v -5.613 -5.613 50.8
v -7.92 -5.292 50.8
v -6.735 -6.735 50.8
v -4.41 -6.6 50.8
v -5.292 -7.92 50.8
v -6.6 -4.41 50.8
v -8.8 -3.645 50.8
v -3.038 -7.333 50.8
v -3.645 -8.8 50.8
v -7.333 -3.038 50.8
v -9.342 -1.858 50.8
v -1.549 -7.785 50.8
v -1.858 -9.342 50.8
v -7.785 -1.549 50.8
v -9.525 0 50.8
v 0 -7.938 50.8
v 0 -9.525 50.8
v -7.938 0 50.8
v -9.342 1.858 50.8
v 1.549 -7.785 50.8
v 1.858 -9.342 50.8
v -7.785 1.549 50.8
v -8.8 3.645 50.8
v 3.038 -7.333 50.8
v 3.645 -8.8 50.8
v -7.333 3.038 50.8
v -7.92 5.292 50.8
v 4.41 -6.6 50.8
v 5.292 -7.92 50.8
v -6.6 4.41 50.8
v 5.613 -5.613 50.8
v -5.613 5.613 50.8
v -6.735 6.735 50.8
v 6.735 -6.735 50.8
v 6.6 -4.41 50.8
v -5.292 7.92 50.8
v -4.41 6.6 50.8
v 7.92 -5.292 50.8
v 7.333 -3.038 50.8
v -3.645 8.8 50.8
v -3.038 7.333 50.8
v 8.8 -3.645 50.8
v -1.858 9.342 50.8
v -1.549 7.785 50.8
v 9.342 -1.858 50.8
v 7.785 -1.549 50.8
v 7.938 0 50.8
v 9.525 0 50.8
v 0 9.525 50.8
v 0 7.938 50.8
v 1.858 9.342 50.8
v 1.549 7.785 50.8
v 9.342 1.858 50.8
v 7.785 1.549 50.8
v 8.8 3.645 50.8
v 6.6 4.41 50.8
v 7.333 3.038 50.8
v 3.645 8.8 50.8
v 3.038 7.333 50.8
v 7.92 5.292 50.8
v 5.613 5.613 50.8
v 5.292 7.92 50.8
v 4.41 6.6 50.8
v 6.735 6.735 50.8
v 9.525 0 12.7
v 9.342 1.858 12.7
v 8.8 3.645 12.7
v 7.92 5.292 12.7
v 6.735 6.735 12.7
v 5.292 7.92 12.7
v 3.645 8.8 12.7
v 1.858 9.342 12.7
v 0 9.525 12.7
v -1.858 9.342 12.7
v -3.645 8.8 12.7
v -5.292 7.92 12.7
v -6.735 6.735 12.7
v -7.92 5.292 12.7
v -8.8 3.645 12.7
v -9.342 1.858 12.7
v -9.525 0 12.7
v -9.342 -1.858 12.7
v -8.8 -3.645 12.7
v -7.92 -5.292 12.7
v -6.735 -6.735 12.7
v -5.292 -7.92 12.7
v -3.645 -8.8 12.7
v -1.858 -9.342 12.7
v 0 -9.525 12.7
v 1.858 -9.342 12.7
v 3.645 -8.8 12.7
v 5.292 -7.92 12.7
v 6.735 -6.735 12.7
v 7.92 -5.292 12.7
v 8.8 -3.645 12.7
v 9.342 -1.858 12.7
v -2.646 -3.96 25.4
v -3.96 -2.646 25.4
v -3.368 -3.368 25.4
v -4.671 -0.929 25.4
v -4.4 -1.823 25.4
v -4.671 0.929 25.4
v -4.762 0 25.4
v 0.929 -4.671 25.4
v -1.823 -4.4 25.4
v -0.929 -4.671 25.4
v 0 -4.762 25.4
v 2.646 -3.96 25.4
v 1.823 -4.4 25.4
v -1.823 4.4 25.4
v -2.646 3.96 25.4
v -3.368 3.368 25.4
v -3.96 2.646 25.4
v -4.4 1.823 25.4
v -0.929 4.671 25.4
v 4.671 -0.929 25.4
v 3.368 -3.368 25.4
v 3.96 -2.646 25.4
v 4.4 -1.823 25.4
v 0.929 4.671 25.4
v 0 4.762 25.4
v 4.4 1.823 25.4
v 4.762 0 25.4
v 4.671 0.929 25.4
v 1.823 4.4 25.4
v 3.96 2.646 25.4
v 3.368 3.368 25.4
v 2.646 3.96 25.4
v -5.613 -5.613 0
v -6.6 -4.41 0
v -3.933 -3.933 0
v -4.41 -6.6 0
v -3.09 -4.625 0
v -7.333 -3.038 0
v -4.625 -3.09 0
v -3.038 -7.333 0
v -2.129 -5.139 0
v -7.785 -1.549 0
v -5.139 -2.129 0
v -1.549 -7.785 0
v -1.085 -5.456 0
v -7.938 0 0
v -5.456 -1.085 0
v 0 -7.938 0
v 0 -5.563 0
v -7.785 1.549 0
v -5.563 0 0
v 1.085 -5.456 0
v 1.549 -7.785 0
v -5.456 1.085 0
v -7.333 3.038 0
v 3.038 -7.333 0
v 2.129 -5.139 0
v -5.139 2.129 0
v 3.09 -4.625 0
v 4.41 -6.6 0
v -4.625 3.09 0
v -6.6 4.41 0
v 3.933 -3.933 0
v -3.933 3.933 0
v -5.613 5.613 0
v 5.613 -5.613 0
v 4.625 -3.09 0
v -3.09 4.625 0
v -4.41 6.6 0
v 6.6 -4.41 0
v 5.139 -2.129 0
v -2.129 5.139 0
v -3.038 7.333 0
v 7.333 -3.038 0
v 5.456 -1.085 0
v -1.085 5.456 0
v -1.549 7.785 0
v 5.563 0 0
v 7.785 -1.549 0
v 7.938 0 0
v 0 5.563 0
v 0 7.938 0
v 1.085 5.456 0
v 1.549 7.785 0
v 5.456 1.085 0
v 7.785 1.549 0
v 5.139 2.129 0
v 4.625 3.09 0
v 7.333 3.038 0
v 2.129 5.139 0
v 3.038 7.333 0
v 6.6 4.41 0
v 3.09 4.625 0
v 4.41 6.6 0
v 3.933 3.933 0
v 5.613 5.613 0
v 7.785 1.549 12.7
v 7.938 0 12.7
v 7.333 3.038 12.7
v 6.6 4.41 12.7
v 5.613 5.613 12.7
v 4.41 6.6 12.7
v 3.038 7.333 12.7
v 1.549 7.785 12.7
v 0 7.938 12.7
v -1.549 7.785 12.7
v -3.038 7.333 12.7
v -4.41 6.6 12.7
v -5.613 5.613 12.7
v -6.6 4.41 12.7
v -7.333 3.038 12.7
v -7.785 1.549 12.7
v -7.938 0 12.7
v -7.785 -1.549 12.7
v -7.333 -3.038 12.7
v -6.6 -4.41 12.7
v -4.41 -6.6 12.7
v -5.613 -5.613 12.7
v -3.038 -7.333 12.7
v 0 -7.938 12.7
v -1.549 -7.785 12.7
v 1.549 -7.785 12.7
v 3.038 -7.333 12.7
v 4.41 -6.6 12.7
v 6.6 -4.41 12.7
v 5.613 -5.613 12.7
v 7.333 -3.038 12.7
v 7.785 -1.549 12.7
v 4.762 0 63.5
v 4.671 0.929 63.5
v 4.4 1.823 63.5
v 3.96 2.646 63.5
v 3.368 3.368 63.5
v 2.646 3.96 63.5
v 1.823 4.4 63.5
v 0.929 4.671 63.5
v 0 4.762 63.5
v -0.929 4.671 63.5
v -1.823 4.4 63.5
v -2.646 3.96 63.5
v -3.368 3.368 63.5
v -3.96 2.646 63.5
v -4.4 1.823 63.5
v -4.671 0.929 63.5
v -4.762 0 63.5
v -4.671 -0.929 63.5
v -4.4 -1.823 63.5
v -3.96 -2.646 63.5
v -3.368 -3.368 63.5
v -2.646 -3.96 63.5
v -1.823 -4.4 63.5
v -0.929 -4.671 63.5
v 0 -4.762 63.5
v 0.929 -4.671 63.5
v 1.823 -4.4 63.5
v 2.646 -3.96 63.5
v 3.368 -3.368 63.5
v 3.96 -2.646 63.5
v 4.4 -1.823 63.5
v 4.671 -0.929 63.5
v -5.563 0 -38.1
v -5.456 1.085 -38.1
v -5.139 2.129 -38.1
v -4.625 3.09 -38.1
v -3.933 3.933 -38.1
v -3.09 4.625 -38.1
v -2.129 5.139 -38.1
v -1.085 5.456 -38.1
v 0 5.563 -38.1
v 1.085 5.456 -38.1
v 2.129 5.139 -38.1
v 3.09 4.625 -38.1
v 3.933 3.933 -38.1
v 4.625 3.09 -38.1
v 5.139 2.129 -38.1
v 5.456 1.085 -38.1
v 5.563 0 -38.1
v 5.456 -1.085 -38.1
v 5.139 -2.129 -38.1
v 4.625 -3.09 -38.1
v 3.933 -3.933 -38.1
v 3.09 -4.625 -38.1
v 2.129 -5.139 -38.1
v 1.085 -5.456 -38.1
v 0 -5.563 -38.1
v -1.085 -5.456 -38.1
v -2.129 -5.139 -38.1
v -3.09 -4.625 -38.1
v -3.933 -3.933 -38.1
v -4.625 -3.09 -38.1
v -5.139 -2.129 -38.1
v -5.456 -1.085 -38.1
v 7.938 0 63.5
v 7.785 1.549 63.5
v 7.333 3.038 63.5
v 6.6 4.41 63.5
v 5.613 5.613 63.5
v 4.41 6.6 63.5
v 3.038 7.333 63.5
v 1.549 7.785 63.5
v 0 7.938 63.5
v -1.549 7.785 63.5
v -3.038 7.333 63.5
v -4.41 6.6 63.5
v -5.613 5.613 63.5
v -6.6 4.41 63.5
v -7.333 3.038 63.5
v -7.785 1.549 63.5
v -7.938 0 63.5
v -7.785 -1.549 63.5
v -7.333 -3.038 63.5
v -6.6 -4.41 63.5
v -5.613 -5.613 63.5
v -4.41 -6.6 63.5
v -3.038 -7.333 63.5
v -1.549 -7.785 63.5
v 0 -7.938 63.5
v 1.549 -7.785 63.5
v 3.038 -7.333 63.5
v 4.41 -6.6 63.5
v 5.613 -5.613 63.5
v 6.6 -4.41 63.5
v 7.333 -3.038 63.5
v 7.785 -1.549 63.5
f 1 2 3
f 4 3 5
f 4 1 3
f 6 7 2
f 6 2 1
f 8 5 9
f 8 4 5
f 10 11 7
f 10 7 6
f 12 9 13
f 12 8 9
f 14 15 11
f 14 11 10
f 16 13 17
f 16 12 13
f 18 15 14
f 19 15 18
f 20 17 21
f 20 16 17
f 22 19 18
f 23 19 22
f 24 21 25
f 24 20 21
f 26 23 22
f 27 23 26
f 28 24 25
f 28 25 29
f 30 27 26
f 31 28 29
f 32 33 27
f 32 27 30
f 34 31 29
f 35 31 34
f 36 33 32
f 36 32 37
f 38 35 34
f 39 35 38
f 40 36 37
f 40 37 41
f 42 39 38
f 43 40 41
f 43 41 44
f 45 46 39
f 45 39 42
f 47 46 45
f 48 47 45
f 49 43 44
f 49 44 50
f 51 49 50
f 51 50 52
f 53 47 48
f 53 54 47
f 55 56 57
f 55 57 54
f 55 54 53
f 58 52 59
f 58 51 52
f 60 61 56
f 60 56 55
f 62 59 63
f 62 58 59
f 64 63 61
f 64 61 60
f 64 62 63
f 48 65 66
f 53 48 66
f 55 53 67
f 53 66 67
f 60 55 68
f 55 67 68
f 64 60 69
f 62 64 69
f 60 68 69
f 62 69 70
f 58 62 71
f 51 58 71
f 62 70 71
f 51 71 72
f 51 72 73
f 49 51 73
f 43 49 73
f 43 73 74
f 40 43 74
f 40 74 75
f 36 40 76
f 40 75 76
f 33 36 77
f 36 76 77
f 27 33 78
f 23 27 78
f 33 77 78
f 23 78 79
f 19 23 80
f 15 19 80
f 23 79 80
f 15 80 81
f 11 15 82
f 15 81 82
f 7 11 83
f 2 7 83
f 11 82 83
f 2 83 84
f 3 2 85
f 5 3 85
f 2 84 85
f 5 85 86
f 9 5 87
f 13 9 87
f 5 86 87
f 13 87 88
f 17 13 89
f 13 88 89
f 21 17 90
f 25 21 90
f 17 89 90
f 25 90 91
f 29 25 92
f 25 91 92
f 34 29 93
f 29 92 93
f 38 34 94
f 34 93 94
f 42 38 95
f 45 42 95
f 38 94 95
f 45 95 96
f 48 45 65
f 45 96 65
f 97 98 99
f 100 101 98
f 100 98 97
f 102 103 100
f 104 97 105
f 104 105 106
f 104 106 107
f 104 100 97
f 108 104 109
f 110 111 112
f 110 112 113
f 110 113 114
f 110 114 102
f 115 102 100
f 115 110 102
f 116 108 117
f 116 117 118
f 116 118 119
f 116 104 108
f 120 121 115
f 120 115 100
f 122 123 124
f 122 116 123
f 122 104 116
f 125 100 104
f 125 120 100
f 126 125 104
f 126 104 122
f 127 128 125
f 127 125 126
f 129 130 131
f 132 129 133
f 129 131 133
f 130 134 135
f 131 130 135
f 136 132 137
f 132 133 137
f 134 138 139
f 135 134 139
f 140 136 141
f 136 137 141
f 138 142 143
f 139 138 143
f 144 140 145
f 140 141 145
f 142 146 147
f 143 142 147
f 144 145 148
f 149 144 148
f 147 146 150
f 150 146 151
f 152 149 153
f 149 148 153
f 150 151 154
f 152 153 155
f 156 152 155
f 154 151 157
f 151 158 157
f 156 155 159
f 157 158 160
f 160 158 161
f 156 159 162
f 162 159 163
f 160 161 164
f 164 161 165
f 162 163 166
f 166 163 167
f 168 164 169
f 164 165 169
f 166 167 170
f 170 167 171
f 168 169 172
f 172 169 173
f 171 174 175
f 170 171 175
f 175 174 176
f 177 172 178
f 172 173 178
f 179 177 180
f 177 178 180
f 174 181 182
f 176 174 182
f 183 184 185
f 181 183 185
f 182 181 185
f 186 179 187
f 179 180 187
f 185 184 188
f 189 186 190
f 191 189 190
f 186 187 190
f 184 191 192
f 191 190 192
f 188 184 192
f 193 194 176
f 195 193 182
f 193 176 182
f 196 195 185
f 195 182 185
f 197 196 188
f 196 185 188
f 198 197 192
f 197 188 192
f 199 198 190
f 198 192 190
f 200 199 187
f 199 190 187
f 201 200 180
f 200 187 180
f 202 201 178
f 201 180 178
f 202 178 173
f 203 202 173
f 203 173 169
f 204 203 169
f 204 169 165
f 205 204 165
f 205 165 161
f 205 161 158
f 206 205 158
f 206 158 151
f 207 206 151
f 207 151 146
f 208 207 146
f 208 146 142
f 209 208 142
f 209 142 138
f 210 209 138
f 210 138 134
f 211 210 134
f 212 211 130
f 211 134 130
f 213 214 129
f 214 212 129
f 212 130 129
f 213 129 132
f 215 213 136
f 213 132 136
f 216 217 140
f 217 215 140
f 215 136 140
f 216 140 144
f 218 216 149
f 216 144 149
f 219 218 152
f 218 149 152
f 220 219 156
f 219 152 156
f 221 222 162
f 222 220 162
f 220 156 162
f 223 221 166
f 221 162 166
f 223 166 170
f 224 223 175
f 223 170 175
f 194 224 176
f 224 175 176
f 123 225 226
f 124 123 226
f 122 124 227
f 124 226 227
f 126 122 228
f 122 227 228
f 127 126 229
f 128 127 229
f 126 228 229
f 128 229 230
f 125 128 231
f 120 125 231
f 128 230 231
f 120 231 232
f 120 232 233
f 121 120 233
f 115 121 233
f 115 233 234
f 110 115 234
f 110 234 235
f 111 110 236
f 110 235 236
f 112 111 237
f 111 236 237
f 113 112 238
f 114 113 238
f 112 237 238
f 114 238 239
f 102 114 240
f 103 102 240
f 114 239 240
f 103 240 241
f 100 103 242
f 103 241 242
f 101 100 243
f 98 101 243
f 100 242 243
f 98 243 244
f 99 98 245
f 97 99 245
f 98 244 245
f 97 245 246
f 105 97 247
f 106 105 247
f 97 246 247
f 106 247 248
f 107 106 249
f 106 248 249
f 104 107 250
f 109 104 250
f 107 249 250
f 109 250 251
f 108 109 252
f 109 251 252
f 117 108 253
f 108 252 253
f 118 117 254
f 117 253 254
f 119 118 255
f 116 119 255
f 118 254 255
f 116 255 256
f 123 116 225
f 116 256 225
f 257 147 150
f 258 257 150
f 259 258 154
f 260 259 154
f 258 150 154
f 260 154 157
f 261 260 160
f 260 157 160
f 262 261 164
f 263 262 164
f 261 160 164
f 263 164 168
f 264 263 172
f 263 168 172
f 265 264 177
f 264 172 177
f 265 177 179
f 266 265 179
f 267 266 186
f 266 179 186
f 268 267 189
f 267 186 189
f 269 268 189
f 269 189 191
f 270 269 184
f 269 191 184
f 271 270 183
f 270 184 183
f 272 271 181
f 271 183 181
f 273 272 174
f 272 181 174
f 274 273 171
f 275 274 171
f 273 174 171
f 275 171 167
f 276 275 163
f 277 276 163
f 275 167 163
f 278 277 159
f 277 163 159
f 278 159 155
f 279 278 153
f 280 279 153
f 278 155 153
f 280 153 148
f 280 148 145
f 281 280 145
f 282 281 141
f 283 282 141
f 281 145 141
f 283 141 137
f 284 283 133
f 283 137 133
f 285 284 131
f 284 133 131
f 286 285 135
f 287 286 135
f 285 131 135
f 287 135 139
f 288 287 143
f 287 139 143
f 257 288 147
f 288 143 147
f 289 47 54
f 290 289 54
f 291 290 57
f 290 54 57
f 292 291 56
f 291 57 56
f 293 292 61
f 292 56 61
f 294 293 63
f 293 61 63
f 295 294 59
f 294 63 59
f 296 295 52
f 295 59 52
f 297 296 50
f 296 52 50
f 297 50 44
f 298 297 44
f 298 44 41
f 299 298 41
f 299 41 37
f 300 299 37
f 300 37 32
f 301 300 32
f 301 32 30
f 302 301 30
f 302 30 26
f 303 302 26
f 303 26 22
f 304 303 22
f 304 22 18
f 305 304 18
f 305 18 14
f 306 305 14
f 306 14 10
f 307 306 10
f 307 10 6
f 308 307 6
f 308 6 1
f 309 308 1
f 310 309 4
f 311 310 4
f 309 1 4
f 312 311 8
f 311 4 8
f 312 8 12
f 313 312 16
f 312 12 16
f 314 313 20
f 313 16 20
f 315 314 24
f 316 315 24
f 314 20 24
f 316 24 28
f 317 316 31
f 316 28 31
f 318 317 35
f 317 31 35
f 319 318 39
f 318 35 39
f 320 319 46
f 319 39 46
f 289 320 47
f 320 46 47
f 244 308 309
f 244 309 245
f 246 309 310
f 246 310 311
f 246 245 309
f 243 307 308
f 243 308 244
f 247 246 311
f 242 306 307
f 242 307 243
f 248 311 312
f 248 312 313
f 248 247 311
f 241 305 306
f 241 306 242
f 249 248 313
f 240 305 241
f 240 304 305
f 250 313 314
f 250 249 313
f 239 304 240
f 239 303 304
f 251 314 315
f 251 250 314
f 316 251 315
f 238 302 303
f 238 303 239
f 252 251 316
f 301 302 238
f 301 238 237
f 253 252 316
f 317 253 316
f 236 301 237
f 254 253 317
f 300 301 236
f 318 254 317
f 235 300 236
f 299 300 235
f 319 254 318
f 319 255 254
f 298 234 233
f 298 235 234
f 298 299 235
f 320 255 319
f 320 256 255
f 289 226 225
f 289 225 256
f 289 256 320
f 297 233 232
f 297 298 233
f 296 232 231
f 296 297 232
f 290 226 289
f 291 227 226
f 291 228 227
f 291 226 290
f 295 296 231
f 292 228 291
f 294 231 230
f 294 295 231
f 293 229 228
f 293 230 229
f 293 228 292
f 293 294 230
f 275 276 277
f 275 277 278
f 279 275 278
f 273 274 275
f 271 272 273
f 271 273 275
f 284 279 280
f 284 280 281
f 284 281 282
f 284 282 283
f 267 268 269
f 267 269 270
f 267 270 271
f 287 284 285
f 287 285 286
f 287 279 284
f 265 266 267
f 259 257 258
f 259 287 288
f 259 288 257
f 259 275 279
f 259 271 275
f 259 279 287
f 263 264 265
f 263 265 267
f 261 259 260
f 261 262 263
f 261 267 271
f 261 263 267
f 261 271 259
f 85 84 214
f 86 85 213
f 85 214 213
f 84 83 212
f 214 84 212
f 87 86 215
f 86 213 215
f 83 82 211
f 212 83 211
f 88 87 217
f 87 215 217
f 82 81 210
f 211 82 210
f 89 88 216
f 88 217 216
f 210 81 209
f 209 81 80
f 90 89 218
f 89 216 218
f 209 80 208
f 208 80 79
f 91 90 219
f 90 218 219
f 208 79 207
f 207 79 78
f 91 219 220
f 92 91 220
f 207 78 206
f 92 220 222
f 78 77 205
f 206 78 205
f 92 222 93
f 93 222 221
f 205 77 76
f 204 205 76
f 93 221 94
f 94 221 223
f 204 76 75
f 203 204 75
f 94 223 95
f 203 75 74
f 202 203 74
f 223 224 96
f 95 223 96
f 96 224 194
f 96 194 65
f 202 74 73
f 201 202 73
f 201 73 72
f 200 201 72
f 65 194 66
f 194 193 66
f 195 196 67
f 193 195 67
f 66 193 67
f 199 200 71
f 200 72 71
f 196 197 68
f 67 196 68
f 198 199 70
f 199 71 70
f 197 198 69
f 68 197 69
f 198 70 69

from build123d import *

# Parameters (mm, degrees)
SKETCH1_R           = 7.9375
BOSS_EXTRUDE1_DEPTH = 63.5
SKETCH4_R           = 5.5626
BOSS_EXTRUDE2_DEPTH = 38.1
SKETCH6_R           = 9.525
BOSS_EXTRUDE4_DEPTH = 38.1
SKETCH3_R           = 4.7625
CUT_EXTRUDE2_DEPTH  = 38.1


with BuildPart() as part:
    # Sketch1 → Boss-Extrude1 (new body)
    with BuildSketch(Plane.XY):
        Circle(SKETCH1_R)
    extrude(amount=BOSS_EXTRUDE1_DEPTH)

    # Sketch4 → Boss-Extrude2 (add)
    with BuildSketch(Plane(origin=(0, 0, 0), x_dir=(-1, 0, 0), z_dir=(0, 0, -1))):
        Circle(SKETCH4_R)
    extrude(amount=BOSS_EXTRUDE2_DEPTH)

    # Sketch6 → Boss-Extrude4 (add)
    with BuildSketch(Plane.XY.offset(12.7)):
        Circle(SKETCH6_R)
    extrude(amount=BOSS_EXTRUDE4_DEPTH)

    # Sketch3 → Cut-Extrude2 (cut)
    with BuildSketch(Plane.XY.offset(63.5)):
        Circle(SKETCH3_R)
    extrude(amount=-CUT_EXTRUDE2_DEPTH, mode=Mode.SUBTRACT)


solid = part.part
